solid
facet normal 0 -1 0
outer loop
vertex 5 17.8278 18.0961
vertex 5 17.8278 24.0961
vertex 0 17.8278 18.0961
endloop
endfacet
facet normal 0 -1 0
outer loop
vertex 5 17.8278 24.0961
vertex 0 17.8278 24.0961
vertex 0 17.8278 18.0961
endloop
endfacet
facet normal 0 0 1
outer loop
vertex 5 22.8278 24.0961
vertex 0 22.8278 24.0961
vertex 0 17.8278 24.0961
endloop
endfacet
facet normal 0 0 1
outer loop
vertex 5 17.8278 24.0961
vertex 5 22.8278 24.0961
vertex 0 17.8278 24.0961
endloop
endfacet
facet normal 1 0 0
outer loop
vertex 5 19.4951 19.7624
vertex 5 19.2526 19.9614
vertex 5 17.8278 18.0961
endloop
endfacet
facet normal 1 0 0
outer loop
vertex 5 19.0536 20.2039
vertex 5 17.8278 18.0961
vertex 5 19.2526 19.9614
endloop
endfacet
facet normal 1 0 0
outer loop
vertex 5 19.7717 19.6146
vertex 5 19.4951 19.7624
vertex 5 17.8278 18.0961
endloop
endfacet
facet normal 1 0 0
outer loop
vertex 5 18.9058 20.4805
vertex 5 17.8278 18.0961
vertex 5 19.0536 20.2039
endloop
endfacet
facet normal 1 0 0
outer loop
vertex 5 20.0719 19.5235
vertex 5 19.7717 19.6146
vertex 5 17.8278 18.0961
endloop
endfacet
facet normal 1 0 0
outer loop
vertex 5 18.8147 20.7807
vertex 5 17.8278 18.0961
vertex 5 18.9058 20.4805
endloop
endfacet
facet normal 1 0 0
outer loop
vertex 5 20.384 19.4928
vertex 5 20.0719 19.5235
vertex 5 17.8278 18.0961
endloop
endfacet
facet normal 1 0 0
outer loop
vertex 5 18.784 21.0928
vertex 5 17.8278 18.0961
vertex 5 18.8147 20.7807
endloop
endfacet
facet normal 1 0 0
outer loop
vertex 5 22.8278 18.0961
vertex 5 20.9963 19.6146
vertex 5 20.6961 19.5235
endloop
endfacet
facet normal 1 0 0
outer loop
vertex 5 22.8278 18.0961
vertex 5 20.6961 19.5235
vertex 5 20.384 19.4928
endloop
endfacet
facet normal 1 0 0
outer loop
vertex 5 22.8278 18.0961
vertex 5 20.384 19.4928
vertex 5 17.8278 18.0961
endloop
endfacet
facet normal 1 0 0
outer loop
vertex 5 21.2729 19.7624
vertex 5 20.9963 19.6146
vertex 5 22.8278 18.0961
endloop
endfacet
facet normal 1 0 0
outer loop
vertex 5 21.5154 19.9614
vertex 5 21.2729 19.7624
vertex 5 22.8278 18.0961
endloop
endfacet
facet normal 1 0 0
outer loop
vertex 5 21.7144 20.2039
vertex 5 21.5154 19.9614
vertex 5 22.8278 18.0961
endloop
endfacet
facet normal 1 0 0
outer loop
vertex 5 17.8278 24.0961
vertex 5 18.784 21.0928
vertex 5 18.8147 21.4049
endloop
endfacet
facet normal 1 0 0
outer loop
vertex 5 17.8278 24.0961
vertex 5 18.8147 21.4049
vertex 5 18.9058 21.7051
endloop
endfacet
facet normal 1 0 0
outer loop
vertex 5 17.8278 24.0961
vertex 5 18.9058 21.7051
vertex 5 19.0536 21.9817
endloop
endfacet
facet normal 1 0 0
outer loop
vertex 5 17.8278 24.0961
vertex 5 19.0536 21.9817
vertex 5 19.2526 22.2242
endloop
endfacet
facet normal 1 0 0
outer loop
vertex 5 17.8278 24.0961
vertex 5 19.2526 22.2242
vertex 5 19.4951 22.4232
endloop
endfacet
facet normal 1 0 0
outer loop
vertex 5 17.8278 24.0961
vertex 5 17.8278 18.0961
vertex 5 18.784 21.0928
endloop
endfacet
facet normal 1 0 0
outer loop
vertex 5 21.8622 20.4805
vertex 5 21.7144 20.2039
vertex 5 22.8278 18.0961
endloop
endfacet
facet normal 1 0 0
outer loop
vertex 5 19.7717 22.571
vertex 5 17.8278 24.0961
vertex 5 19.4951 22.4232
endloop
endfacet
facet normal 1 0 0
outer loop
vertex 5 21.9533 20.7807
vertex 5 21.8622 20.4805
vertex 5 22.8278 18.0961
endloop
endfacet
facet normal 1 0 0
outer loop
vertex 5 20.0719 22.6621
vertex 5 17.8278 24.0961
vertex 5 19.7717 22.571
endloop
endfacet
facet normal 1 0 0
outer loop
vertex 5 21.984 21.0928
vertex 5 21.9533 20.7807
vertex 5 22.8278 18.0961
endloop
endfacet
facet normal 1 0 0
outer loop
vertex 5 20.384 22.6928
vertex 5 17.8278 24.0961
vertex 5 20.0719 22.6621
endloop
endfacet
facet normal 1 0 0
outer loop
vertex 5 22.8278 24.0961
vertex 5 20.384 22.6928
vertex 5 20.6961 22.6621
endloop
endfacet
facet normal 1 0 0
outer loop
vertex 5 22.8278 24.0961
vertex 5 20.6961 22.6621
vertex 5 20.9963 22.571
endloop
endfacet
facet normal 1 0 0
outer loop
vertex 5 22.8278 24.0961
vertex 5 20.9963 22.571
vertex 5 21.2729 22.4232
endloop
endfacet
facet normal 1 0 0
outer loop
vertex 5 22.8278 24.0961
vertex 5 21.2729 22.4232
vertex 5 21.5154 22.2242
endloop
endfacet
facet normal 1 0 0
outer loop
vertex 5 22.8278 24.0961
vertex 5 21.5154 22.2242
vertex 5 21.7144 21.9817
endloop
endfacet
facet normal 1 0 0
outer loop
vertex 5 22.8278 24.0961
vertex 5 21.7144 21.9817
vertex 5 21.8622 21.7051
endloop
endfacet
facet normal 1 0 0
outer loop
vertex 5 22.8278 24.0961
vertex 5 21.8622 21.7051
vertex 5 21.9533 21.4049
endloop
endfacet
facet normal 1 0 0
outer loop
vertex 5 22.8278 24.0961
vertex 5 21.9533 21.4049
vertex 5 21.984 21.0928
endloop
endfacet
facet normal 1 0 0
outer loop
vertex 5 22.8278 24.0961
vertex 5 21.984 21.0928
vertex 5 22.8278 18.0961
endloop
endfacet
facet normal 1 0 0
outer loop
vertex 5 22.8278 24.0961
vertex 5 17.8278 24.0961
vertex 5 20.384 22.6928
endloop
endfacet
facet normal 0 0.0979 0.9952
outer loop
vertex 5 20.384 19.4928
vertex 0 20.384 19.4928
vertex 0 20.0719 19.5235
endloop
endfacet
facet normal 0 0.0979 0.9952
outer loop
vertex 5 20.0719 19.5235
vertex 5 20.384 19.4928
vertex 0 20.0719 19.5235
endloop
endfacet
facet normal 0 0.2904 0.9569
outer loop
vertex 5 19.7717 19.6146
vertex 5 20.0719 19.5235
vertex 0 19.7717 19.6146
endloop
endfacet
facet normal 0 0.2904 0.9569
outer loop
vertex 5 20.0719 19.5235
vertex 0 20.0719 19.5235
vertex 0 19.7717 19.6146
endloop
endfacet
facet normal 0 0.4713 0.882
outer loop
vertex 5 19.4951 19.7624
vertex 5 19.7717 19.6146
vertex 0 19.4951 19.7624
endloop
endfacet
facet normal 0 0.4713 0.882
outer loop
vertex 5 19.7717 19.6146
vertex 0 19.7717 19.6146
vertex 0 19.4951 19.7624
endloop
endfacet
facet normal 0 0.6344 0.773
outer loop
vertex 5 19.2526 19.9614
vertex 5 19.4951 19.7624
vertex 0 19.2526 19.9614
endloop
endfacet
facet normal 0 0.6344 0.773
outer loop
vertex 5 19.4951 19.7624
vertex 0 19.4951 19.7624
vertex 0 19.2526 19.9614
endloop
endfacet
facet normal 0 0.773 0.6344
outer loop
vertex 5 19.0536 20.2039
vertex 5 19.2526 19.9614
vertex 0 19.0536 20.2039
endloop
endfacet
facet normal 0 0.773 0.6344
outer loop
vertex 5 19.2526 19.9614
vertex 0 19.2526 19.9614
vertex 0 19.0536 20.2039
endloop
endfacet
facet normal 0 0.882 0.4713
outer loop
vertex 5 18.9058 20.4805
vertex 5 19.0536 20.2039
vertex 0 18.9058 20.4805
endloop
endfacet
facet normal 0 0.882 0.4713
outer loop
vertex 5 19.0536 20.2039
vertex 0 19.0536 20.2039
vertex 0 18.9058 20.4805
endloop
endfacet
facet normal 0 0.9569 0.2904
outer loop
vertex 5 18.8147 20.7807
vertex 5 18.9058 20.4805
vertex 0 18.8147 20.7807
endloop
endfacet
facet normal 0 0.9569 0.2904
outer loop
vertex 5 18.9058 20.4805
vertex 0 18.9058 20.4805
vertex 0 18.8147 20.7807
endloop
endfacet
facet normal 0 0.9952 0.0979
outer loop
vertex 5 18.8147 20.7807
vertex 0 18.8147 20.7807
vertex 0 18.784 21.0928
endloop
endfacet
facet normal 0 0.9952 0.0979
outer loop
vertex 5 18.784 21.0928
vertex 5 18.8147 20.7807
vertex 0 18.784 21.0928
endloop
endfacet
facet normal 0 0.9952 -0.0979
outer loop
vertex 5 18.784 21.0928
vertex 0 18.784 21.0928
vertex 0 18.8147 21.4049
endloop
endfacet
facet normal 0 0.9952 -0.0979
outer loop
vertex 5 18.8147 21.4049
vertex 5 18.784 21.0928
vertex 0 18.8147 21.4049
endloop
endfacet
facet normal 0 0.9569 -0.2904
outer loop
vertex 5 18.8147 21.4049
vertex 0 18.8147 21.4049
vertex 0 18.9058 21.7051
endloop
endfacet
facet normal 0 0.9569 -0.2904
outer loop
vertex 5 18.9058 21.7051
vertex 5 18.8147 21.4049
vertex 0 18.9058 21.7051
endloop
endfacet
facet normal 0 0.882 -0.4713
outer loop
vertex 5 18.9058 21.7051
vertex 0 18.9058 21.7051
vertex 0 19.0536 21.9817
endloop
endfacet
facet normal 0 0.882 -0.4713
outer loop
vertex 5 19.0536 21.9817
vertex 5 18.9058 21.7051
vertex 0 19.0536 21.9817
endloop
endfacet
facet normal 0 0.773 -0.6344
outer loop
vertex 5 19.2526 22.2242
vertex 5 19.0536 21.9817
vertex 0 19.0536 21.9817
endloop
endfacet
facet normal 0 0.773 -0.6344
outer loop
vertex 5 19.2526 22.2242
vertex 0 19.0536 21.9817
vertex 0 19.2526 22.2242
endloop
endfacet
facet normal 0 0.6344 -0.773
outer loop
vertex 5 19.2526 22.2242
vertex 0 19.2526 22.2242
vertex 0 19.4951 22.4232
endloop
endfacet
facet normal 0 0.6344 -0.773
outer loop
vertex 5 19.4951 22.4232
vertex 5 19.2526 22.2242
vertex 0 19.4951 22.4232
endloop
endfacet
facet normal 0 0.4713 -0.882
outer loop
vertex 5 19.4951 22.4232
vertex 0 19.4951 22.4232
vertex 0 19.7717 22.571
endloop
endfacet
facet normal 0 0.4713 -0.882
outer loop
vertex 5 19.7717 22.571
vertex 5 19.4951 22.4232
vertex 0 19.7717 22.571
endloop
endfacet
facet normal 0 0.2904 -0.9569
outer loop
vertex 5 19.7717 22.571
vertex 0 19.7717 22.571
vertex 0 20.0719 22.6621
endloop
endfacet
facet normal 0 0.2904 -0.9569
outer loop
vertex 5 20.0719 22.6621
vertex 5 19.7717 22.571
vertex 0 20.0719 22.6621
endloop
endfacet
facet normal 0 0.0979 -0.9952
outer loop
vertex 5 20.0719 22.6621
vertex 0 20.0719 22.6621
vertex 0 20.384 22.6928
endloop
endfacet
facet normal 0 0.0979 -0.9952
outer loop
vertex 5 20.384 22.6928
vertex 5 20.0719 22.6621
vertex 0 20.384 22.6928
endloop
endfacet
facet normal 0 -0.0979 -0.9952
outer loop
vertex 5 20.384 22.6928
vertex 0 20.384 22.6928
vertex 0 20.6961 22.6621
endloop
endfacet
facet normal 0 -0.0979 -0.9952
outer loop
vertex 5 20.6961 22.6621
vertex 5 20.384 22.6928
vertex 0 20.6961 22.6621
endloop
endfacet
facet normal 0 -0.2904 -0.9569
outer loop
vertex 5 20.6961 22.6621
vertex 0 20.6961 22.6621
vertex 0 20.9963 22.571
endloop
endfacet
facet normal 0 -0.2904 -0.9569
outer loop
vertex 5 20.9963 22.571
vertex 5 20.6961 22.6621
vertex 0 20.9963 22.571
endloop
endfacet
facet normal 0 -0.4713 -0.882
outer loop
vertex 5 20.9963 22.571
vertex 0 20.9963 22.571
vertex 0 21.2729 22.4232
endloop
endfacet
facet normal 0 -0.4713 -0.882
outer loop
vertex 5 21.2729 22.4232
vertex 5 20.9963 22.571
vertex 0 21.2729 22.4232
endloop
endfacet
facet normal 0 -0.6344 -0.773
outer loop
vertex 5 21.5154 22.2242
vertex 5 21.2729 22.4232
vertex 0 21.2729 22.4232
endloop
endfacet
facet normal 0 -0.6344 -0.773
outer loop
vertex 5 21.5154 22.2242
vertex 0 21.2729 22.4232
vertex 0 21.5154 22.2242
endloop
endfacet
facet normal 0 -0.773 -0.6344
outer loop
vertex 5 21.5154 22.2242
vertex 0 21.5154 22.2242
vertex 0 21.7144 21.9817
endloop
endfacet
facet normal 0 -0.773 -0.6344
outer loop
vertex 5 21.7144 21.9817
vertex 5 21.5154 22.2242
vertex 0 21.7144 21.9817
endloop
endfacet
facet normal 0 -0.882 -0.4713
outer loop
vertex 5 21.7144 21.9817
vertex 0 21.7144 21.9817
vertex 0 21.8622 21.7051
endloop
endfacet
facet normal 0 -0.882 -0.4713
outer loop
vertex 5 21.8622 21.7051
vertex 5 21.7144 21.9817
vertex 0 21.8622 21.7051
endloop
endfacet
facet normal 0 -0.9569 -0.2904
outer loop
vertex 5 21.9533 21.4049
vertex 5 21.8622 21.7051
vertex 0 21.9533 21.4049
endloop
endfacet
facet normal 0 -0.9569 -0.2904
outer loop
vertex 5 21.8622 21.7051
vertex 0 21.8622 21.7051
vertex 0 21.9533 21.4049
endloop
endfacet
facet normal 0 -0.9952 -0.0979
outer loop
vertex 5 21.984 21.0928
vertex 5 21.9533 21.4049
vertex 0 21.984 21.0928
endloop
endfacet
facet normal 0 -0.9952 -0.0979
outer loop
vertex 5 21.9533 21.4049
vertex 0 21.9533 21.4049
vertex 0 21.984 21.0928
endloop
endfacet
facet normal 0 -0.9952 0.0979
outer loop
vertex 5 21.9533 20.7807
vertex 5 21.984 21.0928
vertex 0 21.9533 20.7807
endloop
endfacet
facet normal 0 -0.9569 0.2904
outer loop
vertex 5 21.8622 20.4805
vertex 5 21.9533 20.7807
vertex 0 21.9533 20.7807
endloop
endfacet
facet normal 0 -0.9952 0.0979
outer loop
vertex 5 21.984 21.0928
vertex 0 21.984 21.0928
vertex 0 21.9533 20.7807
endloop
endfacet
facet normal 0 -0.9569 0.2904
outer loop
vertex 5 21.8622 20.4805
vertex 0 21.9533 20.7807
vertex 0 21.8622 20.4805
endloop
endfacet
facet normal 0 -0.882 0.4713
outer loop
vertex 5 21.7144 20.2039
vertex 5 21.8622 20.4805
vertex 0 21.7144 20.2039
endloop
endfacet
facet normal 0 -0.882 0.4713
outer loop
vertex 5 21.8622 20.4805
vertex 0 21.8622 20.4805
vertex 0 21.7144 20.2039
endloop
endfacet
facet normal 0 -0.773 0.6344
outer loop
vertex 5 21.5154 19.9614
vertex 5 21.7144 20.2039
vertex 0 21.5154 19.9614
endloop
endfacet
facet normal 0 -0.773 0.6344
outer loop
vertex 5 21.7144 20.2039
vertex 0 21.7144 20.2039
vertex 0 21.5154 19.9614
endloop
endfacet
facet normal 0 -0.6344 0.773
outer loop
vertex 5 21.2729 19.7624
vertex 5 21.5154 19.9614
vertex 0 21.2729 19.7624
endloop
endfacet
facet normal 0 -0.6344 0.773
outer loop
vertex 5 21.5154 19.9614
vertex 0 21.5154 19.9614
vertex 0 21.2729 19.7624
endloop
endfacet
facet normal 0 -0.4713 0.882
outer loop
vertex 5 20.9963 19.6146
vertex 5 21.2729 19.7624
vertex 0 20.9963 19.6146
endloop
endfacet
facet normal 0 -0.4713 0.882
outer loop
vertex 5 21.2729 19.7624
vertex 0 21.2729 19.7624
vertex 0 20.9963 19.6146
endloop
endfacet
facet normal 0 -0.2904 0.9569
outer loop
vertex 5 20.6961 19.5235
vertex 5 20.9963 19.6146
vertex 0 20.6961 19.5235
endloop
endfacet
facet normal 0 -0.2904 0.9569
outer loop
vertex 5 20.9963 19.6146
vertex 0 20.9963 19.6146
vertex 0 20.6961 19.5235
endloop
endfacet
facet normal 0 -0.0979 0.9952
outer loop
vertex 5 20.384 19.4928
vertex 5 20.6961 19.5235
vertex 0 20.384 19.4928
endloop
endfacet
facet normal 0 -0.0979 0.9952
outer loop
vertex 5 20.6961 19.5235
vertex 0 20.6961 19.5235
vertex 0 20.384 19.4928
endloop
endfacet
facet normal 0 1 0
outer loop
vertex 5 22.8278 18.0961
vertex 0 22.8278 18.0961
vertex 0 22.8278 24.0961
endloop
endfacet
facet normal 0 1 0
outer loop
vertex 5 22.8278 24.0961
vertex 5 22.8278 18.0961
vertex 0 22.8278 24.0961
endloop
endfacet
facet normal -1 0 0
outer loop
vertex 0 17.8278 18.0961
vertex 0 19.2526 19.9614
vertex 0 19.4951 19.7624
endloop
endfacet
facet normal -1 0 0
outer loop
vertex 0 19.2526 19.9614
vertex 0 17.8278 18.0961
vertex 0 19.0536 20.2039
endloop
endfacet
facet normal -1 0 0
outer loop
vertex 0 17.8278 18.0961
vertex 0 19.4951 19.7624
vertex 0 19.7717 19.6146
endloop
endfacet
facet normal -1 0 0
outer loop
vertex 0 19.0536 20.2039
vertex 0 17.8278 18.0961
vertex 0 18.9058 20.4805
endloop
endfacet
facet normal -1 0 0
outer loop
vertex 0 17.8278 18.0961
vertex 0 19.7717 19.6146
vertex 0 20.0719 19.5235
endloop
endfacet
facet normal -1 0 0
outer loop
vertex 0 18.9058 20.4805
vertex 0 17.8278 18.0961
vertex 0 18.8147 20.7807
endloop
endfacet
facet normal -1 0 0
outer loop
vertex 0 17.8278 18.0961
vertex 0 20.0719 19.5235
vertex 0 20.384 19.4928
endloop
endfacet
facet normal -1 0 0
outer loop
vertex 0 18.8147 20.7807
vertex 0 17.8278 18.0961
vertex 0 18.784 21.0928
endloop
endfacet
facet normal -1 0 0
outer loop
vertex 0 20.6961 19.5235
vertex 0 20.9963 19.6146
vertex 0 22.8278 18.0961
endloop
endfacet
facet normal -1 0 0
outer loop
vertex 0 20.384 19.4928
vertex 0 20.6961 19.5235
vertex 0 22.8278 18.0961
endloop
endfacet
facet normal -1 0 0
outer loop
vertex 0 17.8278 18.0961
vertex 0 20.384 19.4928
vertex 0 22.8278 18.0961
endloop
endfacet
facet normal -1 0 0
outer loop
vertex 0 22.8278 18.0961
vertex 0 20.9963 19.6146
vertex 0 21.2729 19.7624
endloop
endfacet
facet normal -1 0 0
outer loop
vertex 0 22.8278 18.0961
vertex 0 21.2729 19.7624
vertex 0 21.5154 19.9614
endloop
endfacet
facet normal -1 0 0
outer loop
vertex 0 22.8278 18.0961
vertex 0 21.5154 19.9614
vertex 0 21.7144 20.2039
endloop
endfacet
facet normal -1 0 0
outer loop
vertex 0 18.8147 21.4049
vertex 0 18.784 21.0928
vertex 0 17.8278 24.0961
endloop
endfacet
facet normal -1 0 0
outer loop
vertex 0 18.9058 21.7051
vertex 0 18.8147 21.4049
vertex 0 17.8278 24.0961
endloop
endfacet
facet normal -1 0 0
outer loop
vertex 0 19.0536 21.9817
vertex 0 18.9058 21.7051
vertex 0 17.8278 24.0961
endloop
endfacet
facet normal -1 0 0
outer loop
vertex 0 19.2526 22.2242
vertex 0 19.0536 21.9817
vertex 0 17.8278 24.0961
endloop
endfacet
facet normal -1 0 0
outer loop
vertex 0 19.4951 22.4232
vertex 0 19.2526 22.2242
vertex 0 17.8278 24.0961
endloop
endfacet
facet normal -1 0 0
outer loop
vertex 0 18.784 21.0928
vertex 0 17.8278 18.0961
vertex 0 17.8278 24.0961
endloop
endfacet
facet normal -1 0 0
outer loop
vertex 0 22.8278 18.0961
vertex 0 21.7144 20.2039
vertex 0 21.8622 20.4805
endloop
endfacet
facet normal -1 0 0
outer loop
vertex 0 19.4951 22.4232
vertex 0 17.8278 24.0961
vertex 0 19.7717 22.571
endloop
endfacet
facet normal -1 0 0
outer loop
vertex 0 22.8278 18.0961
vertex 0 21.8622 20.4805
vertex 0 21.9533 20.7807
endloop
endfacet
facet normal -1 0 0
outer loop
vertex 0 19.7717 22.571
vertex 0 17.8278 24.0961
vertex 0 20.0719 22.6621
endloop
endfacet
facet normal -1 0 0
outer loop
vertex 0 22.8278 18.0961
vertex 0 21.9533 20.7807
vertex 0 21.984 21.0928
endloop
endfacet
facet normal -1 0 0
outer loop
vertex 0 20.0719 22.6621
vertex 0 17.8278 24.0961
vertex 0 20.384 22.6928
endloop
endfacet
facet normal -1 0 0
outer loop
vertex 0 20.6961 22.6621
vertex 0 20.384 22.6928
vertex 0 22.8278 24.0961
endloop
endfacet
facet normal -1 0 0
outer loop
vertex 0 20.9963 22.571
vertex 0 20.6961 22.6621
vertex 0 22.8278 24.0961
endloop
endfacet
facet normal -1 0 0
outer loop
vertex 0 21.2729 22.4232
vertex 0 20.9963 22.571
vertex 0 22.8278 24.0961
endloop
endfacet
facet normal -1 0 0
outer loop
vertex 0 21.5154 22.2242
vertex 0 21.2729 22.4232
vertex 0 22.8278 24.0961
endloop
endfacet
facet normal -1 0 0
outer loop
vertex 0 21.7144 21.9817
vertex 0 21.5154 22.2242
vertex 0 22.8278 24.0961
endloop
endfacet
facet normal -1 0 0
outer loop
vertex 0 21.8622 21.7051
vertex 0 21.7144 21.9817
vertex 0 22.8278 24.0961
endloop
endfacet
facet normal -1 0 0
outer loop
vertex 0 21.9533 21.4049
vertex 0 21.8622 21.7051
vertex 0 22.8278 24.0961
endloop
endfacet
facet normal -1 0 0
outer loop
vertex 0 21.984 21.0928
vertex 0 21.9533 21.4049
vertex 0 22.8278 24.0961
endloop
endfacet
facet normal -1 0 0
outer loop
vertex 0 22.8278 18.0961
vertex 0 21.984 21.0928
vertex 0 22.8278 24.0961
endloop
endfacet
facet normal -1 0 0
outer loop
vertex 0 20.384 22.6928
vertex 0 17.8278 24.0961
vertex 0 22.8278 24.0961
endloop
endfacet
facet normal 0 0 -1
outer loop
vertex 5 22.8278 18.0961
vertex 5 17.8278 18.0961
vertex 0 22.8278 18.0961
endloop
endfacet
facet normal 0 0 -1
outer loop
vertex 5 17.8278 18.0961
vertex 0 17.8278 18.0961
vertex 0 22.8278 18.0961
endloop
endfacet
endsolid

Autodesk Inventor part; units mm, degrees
ref_plane "YZ Plane" through (0, 0, 0) normal (1, 0, 0) x (0, 1, 0)
ref_plane "XZ Plane" through (0, 0, 0) normal (0, 1, 0) x (-1, 0, 0)
ref_plane "XY Plane" through (0, 0, 0) normal (0, 0, 1) x (1, 0, 0)
sketch "Sketch1" plane through (0, 0, 0) normal (1, 0, 0) x (0, 1, 0)
  line L0 (22.8278, 24.0961) -> (17.8278, 24.0961)
  line L1 (17.8278, 24.0961) -> (17.8278, 18.0961)
  line L2 (17.8278, 18.0961) -> (22.8278, 18.0961)
  line L3 (22.8278, 18.0961) -> (22.8278, 24.0961)
  point P0 (0, 0)
  dimension "d0" = 5
  dimension "d1" = 6
extrude "Extrusion1" add sketch "Sketch1" along normal blind 5
sketch "Sketch2" plane through (5, 0, 0) normal (1, 0, 0) x (0, 0, -1)
  point P0 (0, 0)
  point P1 (-21.0928, 20.384)
hole "Hole1" at (5, 20.384, 21.0928) direction (-1, 0, 0) diameter 3.2 end through all
properties part number "lcdholder"
